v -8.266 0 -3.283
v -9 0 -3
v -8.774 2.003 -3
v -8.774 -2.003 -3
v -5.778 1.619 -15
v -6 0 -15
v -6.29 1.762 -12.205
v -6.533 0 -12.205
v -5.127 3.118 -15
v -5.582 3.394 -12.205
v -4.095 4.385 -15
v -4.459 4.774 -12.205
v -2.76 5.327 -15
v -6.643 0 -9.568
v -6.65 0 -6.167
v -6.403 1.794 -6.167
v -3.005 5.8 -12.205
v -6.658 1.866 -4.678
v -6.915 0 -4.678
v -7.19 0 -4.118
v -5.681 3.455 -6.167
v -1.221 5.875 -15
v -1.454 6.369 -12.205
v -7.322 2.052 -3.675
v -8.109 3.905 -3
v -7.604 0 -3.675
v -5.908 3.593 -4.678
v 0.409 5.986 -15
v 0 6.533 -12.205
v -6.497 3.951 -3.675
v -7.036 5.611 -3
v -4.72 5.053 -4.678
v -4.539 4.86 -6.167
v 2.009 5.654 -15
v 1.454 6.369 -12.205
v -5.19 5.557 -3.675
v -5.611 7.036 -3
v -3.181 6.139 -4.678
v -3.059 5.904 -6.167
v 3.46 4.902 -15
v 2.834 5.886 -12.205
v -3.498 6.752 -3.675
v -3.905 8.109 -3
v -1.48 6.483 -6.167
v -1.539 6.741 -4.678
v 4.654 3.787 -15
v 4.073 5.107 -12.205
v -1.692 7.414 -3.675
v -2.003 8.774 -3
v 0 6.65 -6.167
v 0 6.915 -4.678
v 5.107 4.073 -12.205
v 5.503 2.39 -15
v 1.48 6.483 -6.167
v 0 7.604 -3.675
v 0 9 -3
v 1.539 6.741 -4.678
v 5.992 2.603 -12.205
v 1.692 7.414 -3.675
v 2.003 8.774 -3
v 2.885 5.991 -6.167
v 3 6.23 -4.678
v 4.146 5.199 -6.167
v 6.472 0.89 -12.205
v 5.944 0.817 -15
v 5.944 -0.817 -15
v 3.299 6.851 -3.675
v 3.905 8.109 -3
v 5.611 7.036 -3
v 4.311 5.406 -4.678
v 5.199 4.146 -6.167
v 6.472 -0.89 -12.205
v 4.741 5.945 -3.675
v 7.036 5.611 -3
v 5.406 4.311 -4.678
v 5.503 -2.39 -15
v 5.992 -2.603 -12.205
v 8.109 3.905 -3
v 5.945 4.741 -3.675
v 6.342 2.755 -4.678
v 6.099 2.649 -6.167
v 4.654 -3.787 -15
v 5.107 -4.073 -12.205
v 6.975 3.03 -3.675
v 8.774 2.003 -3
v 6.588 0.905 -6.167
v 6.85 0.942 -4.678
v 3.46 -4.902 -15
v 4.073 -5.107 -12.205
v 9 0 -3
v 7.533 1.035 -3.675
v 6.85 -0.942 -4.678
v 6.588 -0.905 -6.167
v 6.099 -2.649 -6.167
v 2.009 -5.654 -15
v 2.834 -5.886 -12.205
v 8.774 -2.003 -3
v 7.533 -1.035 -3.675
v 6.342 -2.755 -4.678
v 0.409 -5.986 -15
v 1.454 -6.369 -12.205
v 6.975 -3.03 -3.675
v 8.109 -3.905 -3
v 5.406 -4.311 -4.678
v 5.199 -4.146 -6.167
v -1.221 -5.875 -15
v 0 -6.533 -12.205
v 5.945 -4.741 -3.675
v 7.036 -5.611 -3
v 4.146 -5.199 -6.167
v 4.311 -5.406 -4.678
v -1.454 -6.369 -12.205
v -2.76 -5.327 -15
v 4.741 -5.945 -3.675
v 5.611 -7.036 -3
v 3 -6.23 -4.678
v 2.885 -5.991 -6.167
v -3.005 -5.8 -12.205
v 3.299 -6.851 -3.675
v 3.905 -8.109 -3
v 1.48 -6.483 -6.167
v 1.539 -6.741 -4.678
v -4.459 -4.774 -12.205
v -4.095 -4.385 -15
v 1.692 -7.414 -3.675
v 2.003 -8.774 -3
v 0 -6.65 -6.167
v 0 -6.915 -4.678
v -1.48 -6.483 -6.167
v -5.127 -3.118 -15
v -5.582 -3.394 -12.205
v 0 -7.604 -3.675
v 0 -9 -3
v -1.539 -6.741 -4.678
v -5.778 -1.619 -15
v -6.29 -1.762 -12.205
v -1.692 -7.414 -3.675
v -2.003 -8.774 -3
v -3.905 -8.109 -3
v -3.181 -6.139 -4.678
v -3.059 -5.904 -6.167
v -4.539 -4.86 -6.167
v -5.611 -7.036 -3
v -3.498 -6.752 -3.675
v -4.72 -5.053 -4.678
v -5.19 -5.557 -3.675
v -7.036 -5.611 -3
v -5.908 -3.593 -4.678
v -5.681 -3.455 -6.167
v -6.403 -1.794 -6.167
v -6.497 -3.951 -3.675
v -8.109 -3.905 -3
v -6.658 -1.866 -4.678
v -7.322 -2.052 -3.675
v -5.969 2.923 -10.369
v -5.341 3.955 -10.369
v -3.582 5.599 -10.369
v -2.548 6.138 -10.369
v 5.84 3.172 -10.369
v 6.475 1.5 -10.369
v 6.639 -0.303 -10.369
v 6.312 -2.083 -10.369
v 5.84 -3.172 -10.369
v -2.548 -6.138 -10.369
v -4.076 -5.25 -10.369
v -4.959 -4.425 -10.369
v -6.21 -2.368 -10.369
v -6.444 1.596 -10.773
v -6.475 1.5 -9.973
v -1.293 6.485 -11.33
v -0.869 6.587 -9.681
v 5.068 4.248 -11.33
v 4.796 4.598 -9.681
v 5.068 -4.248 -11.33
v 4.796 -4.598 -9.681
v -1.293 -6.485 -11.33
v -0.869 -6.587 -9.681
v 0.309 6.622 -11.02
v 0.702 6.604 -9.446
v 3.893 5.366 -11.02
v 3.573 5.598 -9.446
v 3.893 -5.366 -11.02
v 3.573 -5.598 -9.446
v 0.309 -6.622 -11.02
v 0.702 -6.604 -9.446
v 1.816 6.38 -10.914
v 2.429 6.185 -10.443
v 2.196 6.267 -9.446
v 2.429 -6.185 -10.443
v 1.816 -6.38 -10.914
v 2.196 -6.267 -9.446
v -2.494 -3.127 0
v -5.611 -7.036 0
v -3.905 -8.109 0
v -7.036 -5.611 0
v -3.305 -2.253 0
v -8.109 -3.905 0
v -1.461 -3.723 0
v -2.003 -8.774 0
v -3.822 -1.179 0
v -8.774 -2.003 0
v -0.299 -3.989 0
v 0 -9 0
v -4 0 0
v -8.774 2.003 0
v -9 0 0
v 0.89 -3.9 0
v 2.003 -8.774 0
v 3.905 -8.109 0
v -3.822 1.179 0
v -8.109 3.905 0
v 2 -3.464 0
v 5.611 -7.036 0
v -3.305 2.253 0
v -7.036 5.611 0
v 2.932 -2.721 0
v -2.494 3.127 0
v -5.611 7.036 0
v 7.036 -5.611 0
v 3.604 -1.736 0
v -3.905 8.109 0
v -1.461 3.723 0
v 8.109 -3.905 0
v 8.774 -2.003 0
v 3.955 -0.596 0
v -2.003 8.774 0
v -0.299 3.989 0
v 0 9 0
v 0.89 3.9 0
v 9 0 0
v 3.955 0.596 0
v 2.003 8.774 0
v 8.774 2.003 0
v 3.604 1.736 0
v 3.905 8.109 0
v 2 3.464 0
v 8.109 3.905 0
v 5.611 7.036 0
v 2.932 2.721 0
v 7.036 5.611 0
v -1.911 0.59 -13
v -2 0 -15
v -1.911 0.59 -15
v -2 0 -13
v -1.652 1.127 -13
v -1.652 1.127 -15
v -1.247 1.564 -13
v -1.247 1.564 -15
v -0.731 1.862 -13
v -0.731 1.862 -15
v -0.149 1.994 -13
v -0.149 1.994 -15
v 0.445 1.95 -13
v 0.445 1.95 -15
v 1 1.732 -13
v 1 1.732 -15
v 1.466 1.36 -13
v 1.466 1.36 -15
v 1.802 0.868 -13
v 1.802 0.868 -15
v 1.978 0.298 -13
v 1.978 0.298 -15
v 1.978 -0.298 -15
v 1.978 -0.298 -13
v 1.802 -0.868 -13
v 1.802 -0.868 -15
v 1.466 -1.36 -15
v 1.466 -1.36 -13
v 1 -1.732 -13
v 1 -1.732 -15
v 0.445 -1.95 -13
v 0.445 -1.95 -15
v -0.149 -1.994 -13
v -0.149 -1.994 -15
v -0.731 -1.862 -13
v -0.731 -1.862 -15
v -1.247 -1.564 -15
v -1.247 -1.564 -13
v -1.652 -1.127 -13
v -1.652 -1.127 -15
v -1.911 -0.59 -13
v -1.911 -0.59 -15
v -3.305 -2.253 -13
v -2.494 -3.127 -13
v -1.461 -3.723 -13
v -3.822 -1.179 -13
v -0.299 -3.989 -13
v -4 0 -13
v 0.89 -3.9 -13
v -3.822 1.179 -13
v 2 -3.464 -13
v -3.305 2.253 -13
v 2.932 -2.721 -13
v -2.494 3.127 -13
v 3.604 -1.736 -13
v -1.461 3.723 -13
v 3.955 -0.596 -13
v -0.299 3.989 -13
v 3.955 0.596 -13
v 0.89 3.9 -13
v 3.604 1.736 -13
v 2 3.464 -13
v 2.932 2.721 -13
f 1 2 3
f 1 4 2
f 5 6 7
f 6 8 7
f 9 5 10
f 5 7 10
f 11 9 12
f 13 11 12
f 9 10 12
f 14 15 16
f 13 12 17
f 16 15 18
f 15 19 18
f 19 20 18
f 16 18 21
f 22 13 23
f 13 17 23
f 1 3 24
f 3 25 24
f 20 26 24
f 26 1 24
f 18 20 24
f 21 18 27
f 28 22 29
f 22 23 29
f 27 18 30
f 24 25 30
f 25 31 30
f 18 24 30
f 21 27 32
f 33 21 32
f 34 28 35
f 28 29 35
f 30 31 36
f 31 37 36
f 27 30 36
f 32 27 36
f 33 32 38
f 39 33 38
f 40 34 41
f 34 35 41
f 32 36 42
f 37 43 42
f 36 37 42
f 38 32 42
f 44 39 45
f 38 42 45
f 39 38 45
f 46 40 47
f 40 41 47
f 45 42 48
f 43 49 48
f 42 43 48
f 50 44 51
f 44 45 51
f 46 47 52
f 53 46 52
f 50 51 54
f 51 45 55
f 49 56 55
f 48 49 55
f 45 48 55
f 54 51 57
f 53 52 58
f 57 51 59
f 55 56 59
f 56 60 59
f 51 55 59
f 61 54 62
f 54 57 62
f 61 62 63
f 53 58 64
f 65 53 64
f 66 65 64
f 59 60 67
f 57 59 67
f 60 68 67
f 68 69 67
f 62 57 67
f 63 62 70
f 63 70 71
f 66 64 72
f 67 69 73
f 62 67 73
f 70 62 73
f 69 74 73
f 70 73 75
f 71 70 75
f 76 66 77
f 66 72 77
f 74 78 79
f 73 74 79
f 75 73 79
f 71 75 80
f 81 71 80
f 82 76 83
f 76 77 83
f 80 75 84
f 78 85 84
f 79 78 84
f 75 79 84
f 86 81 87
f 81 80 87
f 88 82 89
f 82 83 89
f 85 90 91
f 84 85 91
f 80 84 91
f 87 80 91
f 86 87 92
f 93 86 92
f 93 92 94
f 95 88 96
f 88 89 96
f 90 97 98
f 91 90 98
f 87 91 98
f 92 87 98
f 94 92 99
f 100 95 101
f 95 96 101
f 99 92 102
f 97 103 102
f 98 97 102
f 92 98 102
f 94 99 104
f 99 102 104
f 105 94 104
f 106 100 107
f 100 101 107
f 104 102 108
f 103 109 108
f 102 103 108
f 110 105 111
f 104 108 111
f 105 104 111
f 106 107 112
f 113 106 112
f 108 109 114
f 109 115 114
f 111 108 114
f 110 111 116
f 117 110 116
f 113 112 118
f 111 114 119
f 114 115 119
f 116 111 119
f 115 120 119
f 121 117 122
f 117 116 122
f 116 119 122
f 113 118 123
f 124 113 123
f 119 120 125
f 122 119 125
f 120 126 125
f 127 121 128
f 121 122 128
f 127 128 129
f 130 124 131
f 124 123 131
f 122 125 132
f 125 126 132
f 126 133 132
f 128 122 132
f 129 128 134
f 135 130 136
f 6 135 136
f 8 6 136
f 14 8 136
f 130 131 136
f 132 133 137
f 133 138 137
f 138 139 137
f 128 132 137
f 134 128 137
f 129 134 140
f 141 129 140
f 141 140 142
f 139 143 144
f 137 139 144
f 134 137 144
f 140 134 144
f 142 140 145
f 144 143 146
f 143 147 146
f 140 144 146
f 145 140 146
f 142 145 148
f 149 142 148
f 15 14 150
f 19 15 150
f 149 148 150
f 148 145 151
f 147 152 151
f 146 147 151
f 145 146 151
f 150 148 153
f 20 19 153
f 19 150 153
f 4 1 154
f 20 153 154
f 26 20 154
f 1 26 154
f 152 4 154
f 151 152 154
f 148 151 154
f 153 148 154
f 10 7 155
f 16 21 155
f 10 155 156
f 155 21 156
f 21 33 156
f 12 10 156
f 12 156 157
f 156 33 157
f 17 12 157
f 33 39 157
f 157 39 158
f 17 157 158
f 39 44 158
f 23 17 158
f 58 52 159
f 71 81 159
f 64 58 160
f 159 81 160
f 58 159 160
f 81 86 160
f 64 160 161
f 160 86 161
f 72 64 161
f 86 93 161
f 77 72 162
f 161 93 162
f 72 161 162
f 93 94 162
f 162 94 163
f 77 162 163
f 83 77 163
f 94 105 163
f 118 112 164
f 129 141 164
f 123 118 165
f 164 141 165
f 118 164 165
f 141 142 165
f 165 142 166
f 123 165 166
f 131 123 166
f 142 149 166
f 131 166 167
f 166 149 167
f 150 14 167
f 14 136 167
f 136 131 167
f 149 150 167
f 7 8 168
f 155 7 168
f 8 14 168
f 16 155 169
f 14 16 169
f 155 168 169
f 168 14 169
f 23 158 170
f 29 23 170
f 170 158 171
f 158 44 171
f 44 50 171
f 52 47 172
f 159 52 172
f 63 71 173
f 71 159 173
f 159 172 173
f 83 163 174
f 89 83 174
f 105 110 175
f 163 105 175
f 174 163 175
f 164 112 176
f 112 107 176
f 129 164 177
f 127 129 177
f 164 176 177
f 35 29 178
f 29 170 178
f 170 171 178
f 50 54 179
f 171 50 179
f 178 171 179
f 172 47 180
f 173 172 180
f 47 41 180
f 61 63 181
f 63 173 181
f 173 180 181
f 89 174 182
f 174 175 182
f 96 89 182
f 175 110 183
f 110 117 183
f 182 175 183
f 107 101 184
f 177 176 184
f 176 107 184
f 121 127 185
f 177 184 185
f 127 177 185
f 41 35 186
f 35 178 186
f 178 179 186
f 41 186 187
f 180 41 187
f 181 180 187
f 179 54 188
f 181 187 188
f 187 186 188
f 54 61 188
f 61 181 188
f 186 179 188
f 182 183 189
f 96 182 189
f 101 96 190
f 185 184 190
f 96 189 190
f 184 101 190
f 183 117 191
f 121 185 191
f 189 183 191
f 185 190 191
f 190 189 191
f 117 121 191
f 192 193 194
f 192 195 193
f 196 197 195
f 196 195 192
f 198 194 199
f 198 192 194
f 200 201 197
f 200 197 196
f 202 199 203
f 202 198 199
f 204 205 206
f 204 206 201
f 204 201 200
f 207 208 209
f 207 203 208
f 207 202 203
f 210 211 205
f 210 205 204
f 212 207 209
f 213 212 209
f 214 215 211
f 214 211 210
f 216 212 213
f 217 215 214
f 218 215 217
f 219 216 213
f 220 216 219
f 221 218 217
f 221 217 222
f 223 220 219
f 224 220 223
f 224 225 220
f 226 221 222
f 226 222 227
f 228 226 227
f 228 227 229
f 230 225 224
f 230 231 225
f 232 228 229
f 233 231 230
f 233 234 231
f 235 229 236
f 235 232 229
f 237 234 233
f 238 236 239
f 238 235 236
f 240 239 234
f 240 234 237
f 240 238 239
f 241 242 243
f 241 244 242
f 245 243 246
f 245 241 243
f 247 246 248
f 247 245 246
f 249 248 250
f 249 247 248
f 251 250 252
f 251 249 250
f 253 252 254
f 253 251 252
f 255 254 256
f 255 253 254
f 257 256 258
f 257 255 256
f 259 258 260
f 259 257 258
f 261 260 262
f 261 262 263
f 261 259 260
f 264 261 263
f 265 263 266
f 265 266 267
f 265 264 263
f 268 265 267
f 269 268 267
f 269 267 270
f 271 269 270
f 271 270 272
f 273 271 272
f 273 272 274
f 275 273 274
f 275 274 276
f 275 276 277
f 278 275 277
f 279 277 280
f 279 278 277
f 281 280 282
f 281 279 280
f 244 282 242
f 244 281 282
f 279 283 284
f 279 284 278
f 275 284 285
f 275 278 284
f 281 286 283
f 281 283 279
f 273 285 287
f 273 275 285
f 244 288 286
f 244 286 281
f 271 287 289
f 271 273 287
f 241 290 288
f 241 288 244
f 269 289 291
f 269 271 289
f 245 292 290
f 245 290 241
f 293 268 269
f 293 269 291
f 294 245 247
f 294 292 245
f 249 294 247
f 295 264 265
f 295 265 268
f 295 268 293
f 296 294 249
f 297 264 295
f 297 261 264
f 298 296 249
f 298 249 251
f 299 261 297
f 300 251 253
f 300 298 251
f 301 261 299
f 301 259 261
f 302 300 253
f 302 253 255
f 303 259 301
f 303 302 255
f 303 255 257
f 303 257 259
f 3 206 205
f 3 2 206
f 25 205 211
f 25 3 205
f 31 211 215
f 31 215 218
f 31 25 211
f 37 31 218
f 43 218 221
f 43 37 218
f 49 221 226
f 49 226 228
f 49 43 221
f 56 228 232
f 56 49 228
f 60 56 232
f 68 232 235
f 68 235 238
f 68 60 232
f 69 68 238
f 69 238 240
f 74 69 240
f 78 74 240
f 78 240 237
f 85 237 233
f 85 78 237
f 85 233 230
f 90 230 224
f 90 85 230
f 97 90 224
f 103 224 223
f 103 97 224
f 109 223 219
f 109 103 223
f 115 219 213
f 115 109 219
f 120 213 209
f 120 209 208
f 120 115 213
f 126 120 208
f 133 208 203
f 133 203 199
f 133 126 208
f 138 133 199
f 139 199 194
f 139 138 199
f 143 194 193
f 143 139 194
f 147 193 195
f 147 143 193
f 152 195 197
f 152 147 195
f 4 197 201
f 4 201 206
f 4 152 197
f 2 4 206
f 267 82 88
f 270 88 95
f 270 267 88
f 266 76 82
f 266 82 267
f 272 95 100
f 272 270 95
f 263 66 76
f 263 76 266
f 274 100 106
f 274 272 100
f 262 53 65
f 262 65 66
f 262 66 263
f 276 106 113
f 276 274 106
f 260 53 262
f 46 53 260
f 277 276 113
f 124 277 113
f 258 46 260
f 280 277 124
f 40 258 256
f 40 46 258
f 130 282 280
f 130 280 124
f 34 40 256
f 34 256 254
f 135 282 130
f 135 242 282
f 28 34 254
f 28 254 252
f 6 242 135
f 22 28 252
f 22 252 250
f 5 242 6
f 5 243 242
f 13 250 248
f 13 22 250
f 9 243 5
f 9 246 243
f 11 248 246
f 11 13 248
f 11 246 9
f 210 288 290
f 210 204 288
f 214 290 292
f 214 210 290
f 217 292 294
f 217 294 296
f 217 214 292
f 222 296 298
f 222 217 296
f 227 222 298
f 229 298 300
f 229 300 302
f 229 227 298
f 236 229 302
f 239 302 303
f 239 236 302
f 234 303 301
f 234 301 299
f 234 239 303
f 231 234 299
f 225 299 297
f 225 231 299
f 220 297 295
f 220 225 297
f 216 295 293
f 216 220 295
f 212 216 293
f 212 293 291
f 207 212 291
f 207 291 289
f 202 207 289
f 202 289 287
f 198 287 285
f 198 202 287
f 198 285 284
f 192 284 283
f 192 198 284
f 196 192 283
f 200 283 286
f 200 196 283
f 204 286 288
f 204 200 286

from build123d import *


with BuildPart() as f1:
    # F0 (on Front) → F1 (revolve)
    with BuildSketch(Plane.XZ):
        with BuildLine():
            Line((-4, 0), (-9, 0))
            Line((-9, 0), (-9, -3))
            add(Edge.make_bspline(
                [(-6, -15), (-6.2992899593, -13.7156231877), (-6.9570491012, -10.8929070771), (-6.180231646, -4.0004939564), (-8.2202334339, -3.276672279), (-9, -3)],
                knots=[0, 0, 0, 0, 0.3402720465, 0.7478267892, 1, 1, 1, 1], degree=3))
            Line((-6, -15), (-2, -15))
            Line((-2, -15), (-2, -13))
            Line((-2, -13), (-4, -13))
            Line((-4, -13), (-4, 0))
        make_face()
    revolve(axis=Axis((0, 0, -8.2239229232), (0, 0, -1)))


solid = f1.part
